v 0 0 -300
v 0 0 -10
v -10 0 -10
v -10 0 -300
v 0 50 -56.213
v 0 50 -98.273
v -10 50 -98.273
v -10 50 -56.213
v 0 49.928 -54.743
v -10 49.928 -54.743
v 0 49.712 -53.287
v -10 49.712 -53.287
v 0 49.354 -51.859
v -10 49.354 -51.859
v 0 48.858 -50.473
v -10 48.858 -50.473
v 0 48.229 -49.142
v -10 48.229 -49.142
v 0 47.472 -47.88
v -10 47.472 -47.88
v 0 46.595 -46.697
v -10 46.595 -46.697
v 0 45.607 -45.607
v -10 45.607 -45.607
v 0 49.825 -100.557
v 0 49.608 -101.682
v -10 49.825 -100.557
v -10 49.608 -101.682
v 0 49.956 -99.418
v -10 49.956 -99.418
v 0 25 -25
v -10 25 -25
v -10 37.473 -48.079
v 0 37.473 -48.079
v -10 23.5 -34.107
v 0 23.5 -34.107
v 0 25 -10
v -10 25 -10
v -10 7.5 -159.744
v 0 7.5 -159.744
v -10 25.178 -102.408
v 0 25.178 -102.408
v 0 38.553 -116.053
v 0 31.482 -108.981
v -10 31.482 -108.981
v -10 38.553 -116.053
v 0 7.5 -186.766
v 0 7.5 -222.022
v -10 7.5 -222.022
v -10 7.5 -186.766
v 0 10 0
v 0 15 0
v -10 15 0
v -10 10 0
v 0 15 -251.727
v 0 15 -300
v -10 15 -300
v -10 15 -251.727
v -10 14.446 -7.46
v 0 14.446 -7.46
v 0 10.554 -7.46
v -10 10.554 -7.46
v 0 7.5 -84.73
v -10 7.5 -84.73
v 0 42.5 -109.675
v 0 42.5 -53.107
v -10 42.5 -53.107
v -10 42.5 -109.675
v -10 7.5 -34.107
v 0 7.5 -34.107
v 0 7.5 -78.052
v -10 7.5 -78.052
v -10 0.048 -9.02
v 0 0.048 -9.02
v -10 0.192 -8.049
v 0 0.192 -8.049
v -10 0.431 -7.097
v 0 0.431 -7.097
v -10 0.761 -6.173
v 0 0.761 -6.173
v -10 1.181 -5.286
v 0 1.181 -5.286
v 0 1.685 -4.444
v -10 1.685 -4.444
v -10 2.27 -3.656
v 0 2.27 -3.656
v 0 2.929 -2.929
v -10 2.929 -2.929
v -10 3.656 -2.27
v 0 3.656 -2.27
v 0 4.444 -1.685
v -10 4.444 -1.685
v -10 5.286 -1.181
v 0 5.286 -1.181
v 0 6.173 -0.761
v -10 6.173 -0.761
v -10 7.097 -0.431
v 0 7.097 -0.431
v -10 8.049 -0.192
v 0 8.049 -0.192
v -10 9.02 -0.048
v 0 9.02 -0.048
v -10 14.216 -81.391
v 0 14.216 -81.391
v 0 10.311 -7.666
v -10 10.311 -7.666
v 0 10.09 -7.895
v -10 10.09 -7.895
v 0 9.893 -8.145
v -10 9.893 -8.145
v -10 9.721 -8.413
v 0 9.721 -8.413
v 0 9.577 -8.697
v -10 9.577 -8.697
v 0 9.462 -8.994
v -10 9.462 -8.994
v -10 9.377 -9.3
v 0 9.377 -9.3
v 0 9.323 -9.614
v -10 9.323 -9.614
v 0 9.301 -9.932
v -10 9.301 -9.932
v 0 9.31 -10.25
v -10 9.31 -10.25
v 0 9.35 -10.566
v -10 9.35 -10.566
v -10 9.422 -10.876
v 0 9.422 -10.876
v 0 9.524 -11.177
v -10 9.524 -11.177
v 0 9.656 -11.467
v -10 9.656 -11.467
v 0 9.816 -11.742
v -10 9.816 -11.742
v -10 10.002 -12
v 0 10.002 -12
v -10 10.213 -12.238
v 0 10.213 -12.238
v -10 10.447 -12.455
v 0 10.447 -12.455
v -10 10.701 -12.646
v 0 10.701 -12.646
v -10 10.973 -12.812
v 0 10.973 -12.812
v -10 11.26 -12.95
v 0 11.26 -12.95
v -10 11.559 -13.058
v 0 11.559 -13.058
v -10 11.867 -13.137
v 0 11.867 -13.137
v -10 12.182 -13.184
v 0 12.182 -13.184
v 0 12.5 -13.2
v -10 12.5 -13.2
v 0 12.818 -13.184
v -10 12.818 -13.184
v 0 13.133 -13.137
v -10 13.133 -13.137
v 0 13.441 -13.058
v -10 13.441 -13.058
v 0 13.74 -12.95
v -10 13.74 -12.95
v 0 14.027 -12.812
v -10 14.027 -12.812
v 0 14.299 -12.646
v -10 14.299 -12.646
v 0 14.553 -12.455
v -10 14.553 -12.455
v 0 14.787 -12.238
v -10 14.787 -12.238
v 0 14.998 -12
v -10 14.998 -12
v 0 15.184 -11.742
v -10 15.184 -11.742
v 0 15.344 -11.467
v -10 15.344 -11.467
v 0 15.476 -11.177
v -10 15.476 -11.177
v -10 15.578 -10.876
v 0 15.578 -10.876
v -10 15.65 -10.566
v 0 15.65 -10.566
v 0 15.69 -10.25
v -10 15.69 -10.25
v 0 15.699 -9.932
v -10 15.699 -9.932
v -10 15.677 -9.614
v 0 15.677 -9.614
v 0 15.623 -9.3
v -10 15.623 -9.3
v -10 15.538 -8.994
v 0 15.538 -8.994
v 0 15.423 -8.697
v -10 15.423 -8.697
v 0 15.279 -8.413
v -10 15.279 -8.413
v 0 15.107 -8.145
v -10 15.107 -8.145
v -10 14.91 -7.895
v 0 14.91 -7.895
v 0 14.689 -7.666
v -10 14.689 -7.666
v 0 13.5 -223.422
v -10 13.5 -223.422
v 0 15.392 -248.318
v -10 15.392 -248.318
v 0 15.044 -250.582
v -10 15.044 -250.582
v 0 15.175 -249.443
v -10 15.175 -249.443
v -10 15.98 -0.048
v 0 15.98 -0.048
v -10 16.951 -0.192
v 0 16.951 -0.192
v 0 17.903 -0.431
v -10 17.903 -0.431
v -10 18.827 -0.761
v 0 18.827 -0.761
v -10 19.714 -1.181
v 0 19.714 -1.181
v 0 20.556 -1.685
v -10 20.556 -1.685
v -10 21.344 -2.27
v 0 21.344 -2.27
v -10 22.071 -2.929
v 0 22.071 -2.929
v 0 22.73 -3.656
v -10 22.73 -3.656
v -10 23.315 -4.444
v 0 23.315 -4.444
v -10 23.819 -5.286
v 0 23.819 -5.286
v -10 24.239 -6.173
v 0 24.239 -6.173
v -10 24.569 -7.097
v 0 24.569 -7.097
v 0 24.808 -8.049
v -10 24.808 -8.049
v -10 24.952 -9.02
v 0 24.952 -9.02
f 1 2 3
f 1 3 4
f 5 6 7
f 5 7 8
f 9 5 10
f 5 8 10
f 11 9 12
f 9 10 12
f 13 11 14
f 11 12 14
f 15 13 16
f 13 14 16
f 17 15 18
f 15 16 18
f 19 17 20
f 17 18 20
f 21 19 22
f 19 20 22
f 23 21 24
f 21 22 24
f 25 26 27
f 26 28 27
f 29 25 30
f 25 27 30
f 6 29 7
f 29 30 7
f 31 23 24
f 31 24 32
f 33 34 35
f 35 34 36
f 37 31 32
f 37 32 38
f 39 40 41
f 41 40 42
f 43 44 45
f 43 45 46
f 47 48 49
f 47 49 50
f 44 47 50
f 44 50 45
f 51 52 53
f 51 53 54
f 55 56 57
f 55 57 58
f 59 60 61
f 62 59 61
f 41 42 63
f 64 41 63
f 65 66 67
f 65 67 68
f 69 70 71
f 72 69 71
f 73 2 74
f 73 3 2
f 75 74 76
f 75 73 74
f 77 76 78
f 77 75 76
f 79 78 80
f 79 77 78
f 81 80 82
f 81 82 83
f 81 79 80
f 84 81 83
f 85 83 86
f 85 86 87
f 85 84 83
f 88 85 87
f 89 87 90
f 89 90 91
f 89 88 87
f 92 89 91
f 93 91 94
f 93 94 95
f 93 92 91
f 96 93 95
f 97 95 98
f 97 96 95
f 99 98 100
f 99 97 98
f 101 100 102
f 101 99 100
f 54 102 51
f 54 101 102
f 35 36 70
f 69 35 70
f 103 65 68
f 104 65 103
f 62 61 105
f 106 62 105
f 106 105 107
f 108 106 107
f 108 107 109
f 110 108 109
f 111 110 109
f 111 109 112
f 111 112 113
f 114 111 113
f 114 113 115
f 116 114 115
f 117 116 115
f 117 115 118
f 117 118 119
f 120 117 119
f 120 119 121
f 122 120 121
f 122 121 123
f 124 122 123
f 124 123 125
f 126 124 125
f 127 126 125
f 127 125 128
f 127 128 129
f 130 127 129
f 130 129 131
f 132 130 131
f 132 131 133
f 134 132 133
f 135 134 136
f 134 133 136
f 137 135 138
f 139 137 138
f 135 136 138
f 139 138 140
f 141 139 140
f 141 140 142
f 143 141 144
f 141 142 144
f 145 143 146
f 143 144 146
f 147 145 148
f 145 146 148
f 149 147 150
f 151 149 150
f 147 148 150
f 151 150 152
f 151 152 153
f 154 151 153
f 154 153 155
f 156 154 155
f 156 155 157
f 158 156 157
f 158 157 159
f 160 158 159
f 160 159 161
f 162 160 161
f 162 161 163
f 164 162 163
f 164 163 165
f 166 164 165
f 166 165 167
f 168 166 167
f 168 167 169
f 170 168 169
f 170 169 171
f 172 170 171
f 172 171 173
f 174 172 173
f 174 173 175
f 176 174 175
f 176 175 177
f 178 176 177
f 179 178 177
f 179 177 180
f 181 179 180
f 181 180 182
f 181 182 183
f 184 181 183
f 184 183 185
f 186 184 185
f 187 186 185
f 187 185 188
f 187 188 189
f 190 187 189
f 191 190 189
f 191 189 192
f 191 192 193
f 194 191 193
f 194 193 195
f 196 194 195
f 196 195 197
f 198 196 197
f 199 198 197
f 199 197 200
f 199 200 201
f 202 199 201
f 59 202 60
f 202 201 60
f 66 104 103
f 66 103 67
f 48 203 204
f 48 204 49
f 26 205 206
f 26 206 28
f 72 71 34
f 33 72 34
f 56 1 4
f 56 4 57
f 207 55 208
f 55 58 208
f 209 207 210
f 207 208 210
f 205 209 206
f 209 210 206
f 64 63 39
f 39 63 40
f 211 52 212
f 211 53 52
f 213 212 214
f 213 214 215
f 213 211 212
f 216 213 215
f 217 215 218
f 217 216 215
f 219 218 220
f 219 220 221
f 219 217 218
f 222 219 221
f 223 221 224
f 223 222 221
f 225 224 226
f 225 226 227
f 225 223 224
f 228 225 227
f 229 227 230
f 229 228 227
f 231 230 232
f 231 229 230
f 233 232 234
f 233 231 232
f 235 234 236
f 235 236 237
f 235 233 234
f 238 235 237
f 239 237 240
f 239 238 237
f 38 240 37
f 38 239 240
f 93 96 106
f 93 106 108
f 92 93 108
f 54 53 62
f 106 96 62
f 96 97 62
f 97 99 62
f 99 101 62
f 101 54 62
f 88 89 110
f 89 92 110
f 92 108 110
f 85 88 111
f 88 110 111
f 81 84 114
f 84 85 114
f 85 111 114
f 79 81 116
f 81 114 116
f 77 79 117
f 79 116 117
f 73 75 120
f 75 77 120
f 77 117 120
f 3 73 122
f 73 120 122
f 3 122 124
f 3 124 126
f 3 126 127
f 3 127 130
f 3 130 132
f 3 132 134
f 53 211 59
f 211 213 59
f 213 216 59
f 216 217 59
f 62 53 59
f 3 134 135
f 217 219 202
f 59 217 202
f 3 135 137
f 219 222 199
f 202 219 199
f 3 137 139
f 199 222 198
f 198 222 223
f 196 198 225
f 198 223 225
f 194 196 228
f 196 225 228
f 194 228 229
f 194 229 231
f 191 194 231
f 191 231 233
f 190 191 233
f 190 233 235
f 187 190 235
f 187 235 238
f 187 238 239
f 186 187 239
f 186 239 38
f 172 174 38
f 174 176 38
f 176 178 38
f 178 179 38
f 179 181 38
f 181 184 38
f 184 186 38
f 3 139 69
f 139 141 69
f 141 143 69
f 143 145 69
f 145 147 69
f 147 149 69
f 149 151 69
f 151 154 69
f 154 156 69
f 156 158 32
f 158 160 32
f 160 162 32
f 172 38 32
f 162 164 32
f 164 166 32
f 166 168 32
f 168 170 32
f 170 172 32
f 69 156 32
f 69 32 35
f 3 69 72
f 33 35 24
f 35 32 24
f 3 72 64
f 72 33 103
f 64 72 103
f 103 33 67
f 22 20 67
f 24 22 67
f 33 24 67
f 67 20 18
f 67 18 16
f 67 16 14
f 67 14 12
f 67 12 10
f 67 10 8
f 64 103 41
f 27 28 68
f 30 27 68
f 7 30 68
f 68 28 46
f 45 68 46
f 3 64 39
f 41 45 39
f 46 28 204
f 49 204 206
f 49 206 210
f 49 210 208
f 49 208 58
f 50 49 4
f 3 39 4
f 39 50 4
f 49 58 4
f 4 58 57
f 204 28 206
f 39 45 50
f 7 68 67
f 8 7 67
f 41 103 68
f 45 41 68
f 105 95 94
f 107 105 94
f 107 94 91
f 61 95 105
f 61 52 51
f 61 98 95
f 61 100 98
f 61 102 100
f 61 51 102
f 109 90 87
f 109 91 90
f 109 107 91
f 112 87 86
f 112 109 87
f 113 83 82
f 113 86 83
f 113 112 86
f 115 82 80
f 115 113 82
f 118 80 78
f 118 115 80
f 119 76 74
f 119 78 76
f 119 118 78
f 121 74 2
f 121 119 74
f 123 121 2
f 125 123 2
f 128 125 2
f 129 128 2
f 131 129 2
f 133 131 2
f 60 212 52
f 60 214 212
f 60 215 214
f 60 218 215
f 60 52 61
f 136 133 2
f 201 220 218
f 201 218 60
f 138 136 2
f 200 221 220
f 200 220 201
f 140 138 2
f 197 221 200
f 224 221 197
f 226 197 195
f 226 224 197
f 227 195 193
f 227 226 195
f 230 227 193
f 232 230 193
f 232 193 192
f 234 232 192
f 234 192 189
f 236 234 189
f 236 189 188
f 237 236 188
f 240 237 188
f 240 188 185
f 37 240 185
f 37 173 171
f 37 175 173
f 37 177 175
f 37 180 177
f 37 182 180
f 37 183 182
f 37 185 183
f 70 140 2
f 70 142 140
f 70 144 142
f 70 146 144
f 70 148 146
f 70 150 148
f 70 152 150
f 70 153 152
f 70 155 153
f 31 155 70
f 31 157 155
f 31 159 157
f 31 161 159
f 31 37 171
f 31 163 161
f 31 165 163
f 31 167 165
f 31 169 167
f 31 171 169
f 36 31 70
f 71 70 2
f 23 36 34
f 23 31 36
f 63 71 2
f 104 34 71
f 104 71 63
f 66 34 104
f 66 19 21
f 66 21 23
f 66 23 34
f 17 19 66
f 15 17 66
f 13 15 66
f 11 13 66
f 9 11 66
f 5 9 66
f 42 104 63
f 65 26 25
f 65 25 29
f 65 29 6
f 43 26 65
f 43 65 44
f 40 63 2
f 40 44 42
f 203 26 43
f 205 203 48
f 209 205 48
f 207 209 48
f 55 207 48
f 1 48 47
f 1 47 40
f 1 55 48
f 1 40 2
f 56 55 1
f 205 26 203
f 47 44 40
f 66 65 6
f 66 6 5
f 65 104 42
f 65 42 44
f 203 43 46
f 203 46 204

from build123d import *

# Parameters (mm, degrees)
BOSS_EXTRUDE1_DEPTH = 10
CUT_EXTRUDE2_DEPTH  = 305.302481094
FILLET1_R           = 10
FILLET2_R           = 15


with BuildPart() as part:
    # Sketch1 → Boss-Extrude1 (new body)
    with BuildSketch(Plane(origin=(0, 0, 0), x_dir=(0, 0, -1), z_dir=(1, 0, 0))):
        Polygon((0, 0), (300, 0), (300, 15), (250, 15), (100, 50), (50, 50), (25, 25), (0, 25), align=None)
    extrude(amount=-BOSS_EXTRUDE1_DEPTH)

    # Sketch2 → Cut-Extrude2 (cut, through all)
    with BuildSketch(Plane(origin=(0, 0, 0), x_dir=(0, 0, -1), z_dir=(1, 0, 0))):
        Polygon((53.106601718, 42.5), (109.675144213, 42.5), (81.390872965, 14.215728753), align=None)
        Polygon((34.106601718, 23.5), (34.106601718, 7.5), (78.051863034, 7.5), (48.079232376, 37.472630658), align=None)
        Polygon((102.407552426, 25.17766953), (84.729882897, 7.5), (159.744277132, 7.5), align=None)
        Polygon((116.052511988, 38.552952969), (223.422310427, 13.5), (222.022310427, 7.5), (186.765608253, 7.5), (108.981444176, 31.481885157), align=None)
        with BuildLine():
            Line((7.46, 14.446381258), (7.46, 10.553618742))
            ThreePointArc((7.46, 10.553618742), (13.2, 12.5), (7.46, 14.446381258))
        make_face()
    extrude(amount=-CUT_EXTRUDE2_DEPTH, mode=Mode.SUBTRACT)

    # Fillet1
    fillet1_edges = [part.edges().sort_by_distance(p)[0] for p in [
        (-5, 25, 0),
        (-5, 0, 0),
    ]]
    fillet(fillet1_edges, radius=FILLET1_R)

    # Fillet2
    fillet2_edges = [part.edges().sort_by_distance(p)[0] for p in [
        (-5, 50, -50),
        (-5, 50, -100),
        (-5, 15, -250),
    ]]
    fillet(fillet2_edges, radius=FILLET2_R)


solid = part.part
